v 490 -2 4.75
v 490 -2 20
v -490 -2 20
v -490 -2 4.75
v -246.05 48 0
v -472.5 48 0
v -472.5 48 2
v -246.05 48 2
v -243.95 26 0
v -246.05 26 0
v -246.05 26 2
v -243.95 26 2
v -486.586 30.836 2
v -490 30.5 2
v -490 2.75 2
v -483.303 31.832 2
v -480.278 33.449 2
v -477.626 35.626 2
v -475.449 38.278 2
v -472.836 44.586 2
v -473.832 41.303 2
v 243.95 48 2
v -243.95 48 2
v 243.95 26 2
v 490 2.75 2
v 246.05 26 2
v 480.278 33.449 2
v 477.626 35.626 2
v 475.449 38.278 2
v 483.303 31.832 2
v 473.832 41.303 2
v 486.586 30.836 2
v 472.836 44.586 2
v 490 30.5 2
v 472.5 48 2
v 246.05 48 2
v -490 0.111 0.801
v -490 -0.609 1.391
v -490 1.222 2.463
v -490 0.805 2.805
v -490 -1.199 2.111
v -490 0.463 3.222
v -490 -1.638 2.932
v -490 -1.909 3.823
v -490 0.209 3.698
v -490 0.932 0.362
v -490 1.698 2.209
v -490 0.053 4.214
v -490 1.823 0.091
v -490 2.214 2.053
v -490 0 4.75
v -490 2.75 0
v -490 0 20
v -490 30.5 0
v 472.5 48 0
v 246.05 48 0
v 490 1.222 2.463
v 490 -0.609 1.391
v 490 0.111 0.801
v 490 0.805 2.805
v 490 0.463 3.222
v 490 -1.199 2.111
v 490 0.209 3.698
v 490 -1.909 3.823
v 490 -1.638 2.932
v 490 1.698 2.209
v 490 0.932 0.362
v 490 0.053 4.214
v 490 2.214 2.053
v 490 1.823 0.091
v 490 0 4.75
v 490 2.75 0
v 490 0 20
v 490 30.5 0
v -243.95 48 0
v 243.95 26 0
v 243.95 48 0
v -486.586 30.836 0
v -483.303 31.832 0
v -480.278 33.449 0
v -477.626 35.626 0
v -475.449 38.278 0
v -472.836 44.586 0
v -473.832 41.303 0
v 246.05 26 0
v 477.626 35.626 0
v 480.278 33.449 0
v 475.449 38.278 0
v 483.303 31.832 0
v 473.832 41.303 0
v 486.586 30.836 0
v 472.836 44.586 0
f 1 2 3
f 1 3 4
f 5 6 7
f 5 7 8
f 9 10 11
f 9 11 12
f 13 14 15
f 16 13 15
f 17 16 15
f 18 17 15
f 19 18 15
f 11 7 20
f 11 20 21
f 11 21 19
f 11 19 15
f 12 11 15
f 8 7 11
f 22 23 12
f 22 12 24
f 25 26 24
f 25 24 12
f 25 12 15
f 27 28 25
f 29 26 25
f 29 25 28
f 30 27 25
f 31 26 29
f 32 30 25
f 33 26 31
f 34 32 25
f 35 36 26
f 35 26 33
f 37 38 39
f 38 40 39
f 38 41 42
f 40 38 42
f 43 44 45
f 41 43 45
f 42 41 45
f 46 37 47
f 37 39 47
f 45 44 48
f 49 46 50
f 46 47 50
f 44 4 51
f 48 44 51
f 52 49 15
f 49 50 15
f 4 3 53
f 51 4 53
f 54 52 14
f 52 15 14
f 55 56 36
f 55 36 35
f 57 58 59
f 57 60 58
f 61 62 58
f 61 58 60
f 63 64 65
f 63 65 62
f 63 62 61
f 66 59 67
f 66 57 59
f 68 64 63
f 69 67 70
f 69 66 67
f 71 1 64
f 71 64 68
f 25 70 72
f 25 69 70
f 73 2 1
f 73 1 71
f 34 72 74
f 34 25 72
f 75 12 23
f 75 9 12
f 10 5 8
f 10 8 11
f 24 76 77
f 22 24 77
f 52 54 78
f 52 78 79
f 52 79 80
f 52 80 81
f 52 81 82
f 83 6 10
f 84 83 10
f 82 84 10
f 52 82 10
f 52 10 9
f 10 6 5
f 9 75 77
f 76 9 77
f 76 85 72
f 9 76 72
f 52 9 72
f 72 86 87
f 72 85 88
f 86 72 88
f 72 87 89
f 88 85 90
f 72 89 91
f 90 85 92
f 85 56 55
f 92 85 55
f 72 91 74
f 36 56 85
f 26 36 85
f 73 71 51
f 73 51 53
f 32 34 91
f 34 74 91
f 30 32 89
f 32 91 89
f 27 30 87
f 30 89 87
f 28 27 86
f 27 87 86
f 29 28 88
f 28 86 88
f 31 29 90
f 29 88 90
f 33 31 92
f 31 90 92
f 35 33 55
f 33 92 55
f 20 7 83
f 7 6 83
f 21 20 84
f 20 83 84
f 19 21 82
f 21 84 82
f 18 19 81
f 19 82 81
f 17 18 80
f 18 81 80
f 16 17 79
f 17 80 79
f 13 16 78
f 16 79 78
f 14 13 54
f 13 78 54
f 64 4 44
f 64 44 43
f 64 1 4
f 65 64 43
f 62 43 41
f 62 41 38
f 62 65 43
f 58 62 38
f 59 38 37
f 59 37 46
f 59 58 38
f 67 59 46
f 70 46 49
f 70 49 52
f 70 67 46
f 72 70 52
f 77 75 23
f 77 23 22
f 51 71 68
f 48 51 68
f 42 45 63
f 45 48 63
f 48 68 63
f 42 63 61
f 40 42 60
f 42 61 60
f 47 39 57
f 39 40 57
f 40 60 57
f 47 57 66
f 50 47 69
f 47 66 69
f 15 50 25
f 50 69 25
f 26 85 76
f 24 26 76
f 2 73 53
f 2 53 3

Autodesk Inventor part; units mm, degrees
ref_plane "YZ Plane" through (0, 0, 0) normal (1, 0, 0) x (0, 1, 0)
ref_plane "XZ Plane" through (0, 0, 0) normal (0, 1, 0) x (-1, 0, 0)
ref_plane "XY Plane" through (0, 0, 0) normal (0, 0, 1) x (1, 0, 0)
sketch "Sketch1" plane through (0, 0, 0) normal (0, 0, 1) x (1, 0, 0)
  line L0 (-490, 48) -> (490, 48)
  line L1 (490, 48) -> (490, 0)
  line L2 (490, 0) -> (-490, 0)
  line L3 (-490, 0) -> (-490, 48)
  point P0 (0, 0)
  point P1 (0, 0)
  dimension "d0" = 980
  dimension "d1" = 48
extrude "Plate1" add sketch "Sketch1" along normal blind 2
sketch "Sketch2" plane through (490, -2, 0) normal (0, 1, 0) x (-1, 0, 0)
  line L0 (980, 0) -> (0, 0)
  line L1 (0, 0) -> (0, 20)
  line L2 (0, 20) -> (980, 20)
  line L3 (980, 20) -> (980, 0)
edge flange "Flange1" height 20 angle 90 thickness 2 bend radius 2.75 thickness toward (0, 1, 0) relief round relief width 2 relief depth 1 edges at (0, 0, 2) wall of the first edge with corners at (-490, -2, 0) (490, -2, 0) (490, -2, 20) (-490, -2, 20)
bend "Bend1"
corner "Corner1"
sketch "Sketch5" plane through (0, 0, 0) normal (0, 0, -1) x (-1, 0, 0)
  line L0 (490, 48) -> (-490, 48) projected
  line L1 (490, -2) -> (-490, -2) projected
  circle A0 centre (0, 48) radius 17.5
  line L2 (243.95, 48) -> (246.05, 48)
  line L3 (246.05, 48) -> (246.05, 26)
  line L4 (246.05, 26) -> (243.95, 26)
  line L5 (243.95, 26) -> (243.95, 48)
  line L6 (-243.95, 48) -> (-246.05, 48)
  line L7 (-246.05, 48) -> (-246.05, 26)
  line L8 (-246.05, 26) -> (-243.95, 26)
  line L9 (-243.95, 26) -> (-243.95, 48)
  line L10 (0, 48) -> (0, -2) construction
  line L11 (490, -2) -> (490, 48)
  line L12 (-490, -2) -> (-490, 48)
  circle A1 centre (-490, 48) radius 17.5
  circle A2 centre (490, 48) radius 17.5
  point P0 (0, 0)
  point P1 (245, 26)
  point P2 (-245, 26)
  point P3 (246.05, 48)
  point P4 (-17.5, 48)
  point P5 (17.5, 48)
  point P6 (-246.05, 48)
  point P7 (472.5, 48)
  point P8 (490, 30.5)
  point P9 (-490, 30.5)
  point P10 (-472.5, 48)
  dimension "d45" = 35
  dimension "d48" = 2.1
  dimension "d49" = 490
  dimension "d51" = 28
  dimension "d52" = 22
extrude "Extrusion1" cut sketch "Sketch5" against normal through all contours L3 L4 L5 L0 | L0 L11 A2 | L9 L8 L7 L0 | L12 L0 A1 picked at (488.702, 36.4796) picked at (-478.4796, 46.702)
sketch "Sketch9" plane through (0, 0, 2) normal (0, 0, 1) x (1, 0, 0)
  line L0 (448.2795, 24.3045) -> (448.2795, 12.3045) construction
  line L1 (448.2795, 12.3045) -> (248.2795, 12.3045) construction
  line L2 (248.2795, 12.3045) -> (248.2795, 24.3045) construction
  line L3 (248.2795, 24.3045) -> (448.2795, 24.3045) construction
  line L4 (-490, 48) -> (490, 48) projected
  point P0 (0, 0)
  point P1 (1.05, 68)
  point P2 (490, 48)
  point P3 (-490, 48)
  dimension "d40" = 200
  dimension "d41" = 12
mark "Mark2"
equation "\"d2\" = Thickness"
equation "\"d3\" = BendReliefWidth"
equation "\"d4\" = BendReliefDepth"
equation "\"d5\" = MinimumRemnant"
equation "\"d6\" = TransitionRadius"
equation "\"d9\" = BendRadius"
equation "\"d10\" = CornerReliefSize"
equation "\"d11\" = GapSize"
equation "\"d12\" = JacobiRadiusSize"
equation "\"BendReliefWidth\" = Thickness"
equation "\"BendReliefDepth\" = 0.5 * Thickness"
equation "\"CornerReliefSize\" = 4 * Thickness"
equation "\"MinimumRemnant\" = 2 * Thickness"
equation "\"TransitionRadius\" = BendRadius"
equation "\"JacobiRadiusSize\" = BendRadius"
equation "\"GapSize\" = Thickness"
equation "\"Thickness\" = 2"
equation "\"BendRadius\" = 2.75"
properties part number "MSC 326 STRINGER BOARD  ##" material "Stainless Steel"
